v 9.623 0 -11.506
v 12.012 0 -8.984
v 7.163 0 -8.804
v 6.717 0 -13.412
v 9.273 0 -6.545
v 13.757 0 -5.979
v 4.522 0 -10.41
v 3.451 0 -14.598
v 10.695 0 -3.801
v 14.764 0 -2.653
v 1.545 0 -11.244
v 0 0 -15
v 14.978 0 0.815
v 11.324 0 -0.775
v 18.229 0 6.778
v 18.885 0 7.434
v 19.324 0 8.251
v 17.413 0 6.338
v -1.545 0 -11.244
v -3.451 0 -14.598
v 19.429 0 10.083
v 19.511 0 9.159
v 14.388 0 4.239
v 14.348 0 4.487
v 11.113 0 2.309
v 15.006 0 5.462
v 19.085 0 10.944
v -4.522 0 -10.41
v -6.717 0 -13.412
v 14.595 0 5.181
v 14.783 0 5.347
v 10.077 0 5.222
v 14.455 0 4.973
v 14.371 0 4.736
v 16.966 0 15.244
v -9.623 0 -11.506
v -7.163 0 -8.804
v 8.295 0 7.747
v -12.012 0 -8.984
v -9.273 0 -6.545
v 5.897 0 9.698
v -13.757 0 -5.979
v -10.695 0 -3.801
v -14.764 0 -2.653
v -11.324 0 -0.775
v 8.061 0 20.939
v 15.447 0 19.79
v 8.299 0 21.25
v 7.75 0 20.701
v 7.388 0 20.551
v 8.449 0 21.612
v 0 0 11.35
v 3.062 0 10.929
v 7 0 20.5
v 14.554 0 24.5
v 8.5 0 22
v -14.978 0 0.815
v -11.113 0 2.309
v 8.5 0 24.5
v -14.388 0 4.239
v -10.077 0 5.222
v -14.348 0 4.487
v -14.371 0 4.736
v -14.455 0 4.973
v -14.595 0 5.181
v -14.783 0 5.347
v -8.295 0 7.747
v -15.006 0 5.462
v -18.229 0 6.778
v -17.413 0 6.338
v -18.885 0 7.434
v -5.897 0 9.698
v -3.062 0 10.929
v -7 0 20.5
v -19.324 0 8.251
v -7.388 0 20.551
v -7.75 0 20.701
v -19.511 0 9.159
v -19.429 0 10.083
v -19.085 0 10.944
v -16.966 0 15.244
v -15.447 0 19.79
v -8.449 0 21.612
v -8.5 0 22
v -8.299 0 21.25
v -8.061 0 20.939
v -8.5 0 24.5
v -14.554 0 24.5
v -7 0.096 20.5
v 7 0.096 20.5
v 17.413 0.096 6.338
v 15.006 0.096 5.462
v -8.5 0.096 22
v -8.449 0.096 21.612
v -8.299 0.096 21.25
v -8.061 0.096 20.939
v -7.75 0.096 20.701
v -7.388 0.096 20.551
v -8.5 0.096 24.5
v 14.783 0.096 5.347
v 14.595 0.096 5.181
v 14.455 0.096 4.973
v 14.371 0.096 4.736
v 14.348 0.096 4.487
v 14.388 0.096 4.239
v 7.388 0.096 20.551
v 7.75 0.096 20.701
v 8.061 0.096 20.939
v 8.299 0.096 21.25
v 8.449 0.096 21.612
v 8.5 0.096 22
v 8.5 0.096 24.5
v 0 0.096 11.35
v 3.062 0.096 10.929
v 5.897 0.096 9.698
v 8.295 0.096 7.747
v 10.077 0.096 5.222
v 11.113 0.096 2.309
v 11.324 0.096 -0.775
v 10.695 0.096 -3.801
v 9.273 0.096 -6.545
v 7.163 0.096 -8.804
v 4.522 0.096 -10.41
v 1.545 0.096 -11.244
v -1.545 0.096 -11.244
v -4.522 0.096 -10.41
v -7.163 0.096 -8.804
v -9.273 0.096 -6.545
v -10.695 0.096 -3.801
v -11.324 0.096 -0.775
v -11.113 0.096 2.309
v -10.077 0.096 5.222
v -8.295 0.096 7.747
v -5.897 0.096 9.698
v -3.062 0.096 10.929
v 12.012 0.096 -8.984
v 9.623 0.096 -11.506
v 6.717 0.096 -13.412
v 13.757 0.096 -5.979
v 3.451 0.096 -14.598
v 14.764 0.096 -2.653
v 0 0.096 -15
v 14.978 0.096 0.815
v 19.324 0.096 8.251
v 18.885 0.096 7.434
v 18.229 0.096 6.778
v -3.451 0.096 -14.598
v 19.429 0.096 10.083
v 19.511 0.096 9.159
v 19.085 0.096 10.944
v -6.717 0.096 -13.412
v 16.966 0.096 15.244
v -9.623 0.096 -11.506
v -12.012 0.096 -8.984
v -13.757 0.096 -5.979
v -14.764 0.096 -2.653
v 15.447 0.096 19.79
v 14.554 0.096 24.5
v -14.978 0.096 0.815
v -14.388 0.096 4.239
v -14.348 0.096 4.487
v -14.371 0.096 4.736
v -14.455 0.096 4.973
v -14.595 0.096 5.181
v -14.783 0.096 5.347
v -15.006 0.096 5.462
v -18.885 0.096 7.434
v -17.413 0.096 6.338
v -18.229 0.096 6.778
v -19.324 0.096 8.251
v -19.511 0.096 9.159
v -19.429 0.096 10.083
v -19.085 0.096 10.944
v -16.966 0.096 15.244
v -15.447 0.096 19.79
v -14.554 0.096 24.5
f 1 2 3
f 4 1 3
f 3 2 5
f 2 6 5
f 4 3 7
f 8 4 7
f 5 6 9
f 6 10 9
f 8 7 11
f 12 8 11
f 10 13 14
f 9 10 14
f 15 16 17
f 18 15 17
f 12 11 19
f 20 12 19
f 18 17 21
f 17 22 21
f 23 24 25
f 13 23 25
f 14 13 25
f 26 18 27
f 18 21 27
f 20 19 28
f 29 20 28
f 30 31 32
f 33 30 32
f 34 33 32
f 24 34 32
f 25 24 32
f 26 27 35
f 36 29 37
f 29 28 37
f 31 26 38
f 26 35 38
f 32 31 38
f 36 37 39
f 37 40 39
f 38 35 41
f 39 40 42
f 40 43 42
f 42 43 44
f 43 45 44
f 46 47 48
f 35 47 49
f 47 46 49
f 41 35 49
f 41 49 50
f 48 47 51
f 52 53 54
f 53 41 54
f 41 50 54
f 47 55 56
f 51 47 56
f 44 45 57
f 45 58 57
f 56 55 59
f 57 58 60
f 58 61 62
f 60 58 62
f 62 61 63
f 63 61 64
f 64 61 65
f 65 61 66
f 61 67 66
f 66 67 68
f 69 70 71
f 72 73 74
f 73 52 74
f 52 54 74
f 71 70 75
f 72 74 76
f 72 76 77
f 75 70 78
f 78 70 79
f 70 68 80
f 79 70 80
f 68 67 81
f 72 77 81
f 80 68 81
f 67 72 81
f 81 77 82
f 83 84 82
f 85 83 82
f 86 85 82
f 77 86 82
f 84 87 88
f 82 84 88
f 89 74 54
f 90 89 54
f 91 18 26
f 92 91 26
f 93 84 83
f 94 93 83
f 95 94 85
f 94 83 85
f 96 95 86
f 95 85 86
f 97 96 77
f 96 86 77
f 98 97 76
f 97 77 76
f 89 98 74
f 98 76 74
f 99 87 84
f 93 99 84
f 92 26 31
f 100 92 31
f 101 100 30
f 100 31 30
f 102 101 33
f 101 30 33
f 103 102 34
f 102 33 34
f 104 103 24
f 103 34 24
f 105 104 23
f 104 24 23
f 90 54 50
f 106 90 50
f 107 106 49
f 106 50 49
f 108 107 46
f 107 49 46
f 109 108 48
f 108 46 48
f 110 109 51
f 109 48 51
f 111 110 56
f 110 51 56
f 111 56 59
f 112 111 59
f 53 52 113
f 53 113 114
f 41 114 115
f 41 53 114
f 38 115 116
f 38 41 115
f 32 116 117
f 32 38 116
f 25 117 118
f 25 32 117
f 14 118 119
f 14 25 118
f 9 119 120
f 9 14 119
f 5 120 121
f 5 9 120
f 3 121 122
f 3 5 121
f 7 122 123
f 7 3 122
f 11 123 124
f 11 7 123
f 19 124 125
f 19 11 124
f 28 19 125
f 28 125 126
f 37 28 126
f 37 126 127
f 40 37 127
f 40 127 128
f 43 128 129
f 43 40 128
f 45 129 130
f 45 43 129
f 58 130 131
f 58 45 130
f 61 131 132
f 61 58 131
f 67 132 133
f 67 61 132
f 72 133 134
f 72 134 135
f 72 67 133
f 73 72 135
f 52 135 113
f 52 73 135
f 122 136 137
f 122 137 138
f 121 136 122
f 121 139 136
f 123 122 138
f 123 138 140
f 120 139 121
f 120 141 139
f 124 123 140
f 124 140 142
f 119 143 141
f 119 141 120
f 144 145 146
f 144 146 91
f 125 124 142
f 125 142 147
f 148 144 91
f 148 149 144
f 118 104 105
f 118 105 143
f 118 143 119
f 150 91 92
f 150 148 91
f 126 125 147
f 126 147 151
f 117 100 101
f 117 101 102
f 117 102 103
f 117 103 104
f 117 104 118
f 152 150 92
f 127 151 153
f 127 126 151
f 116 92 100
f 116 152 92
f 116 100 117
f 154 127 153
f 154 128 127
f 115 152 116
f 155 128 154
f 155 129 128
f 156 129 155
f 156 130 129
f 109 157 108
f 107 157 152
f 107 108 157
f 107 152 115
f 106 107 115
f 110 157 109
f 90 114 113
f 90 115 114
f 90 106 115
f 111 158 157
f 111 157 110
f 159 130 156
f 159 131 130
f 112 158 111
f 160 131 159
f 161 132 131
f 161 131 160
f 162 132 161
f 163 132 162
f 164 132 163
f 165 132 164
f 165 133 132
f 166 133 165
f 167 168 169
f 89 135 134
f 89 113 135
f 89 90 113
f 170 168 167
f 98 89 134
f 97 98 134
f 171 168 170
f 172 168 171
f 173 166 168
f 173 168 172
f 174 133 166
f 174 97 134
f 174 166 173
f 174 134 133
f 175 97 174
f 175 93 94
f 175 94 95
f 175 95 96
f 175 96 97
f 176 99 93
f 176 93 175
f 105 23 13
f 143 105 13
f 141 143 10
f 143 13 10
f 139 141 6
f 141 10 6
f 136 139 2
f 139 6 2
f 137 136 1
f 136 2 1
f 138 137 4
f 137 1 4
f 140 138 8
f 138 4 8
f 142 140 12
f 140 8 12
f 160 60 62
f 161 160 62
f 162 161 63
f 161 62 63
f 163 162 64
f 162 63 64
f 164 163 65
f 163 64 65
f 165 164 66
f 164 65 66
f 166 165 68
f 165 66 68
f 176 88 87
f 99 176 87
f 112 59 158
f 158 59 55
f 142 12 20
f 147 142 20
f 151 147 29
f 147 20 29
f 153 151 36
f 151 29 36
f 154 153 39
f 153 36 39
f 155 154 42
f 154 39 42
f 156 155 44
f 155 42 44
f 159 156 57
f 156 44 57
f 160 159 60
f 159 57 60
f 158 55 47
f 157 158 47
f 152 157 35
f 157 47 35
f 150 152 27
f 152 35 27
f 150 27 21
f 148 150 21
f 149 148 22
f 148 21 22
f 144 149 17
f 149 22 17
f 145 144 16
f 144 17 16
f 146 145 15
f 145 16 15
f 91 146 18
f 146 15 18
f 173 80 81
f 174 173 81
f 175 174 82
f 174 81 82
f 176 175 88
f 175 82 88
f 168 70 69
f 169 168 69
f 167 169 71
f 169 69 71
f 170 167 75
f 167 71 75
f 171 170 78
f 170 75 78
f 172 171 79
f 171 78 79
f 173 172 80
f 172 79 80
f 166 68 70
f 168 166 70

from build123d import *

# Parameters (mm, degrees)
SKETCH26_R          = 11.35
BOSS_EXTRUDE1_DEPTH = 0.096


with BuildPart() as part:
    # Sketch26 → Boss-Extrude1 (new body)
    with BuildSketch(Plane(origin=(0, 0, 0), x_dir=(-1, 0, 0), z_dir=(0, 1, 0))):
        with BuildLine():
            Line((-17.412906679, 6.337779723), (-15.005687805, 5.461623706))
            ThreePointArc((-15.005687805, 5.461623706), (-14.455056516, 4.972678709), (-14.388476201, 4.239310392))
            ThreePointArc((-14.388476201, 4.239310392), (-12.012278216, -8.983605738), (0, -15))
            ThreePointArc((0, -15), (12.012278216, -8.983605738), (14.388476201, 4.239310392))
            ThreePointArc((14.388476201, 4.239310392), (14.455056516, 4.972678709), (15.005687805, 5.461623706))
            Line((15.005687805, 5.461623706), (17.412906679, 6.337779723))
            ThreePointArc((17.412906679, 6.337779723), (19.324147584, 8.250755696), (19.084800719, 10.944272346))
            ThreePointArc((19.084800719, 10.944272346), (16.129508637, 17.491581777), (14.553727529, 24.5))
            Line((14.553727529, 24.5), (8.5, 24.5))
            Line((8.5, 24.5), (8.5, 22))
            ThreePointArc((8.5, 22), (8.060660172, 20.939339828), (7, 20.5))
            Line((7, 20.5), (-7, 20.5))
            ThreePointArc((-7, 20.5), (-8.060660172, 20.939339828), (-8.5, 22))
            Line((-8.5, 22), (-8.5, 24.5))
            Line((-8.5, 24.5), (-14.553727529, 24.5))
            ThreePointArc((-14.553727529, 24.5), (-16.129508637, 17.491581777), (-19.084800719, 10.944272346))
            ThreePointArc((-19.084800719, 10.944272346), (-19.324147584, 8.250755696), (-17.412906679, 6.337779723))
        make_face()
        with Locations(Location((0, 0, 0), (0, 0, 90))):
            Circle(SKETCH26_R, mode=Mode.SUBTRACT)
    extrude(amount=BOSS_EXTRUDE1_DEPTH)


solid = part.part
